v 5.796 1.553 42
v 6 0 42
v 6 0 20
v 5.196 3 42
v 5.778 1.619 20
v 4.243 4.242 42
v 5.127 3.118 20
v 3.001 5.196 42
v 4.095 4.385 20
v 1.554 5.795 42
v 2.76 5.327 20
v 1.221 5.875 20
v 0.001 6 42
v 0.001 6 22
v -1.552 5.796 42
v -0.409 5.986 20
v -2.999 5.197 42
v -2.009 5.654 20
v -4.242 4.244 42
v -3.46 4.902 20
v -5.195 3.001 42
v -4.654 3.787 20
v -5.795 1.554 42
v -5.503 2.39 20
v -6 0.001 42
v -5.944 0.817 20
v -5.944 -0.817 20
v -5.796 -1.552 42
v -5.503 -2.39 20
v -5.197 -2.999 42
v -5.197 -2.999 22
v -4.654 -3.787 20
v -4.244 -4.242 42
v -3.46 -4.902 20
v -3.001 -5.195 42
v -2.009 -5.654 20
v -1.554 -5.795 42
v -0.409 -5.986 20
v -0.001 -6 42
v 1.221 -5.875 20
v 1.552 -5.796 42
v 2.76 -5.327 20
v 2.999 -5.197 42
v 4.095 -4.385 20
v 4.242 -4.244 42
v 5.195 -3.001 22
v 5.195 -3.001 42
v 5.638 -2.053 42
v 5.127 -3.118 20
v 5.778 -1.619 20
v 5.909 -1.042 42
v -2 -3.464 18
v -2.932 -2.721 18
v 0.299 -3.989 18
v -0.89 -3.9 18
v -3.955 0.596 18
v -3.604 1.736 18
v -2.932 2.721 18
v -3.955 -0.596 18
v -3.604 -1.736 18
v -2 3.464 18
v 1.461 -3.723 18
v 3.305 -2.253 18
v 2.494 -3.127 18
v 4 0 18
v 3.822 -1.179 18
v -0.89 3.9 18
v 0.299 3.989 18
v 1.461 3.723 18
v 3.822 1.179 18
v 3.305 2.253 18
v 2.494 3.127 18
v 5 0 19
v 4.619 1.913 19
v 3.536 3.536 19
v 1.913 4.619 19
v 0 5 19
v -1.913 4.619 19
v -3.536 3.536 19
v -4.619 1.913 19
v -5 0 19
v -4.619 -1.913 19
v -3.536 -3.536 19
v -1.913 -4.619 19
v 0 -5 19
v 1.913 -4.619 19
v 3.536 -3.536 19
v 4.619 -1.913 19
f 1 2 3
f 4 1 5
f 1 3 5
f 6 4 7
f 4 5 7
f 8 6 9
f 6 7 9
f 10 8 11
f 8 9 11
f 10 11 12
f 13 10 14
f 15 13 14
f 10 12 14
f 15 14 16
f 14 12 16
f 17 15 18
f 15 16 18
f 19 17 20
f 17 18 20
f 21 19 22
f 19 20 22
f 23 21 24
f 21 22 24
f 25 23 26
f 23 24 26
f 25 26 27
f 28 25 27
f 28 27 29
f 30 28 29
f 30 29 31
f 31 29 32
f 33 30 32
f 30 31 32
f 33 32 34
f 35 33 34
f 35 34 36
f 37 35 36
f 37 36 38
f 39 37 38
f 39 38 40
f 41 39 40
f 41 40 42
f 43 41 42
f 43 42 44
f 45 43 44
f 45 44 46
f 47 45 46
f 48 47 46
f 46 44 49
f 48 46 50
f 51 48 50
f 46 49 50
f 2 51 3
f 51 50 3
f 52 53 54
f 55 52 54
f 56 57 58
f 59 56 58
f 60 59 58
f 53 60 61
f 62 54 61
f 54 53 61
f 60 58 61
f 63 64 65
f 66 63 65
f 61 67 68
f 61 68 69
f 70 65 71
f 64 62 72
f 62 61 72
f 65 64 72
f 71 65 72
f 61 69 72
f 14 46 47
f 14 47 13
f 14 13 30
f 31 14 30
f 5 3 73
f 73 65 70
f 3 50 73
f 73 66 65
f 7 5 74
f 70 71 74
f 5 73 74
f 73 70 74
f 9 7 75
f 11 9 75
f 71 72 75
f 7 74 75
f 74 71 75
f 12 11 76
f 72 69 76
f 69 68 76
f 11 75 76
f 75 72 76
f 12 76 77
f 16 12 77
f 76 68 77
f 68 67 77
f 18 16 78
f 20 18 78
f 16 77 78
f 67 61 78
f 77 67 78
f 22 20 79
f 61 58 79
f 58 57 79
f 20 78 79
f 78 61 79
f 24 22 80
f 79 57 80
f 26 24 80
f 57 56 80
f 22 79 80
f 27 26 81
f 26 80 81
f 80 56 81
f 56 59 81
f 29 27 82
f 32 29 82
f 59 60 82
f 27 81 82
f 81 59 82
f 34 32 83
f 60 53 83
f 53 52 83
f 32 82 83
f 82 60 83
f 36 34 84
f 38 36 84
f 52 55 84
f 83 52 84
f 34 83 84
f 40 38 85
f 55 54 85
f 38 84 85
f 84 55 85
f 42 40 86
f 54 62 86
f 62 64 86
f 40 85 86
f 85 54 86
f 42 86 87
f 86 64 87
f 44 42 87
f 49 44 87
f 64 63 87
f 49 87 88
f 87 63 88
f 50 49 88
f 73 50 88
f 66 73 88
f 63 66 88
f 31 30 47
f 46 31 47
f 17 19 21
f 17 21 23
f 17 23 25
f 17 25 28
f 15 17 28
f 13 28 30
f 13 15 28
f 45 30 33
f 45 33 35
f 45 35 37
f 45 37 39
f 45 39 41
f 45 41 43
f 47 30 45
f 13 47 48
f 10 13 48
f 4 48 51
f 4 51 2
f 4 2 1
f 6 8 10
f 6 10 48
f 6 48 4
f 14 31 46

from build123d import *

# Parameters (mm, degrees)
SKETCH008_R     = 6
PAD002_DEPTH    = 24
POCKET_DEPTH    = 20
CHAMFER001_SIZE = 2


with BuildPart() as part:
    # Sketch008 → Pad002 (new body)
    with BuildSketch(Plane.XY.offset(18)):
        Circle(SKETCH008_R)
    extrude(amount=PAD002_DEPTH)

    # Sketch007 (on Face3 of Pad002) → Pocket (cut)
    with BuildSketch(Plane.XY.offset(42)):
        Polygon((5.195447, -3.001222), (0.001411, 6), (-5.196858, -2.998778), align=None)
    extrude(amount=-POCKET_DEPTH, mode=Mode.SUBTRACT)

    # Chamfer001
    chamfer001_edges = [part.edges().sort_by_distance(p)[0] for p in [
        (-6, 0, 18),
    ]]
    chamfer(chamfer001_edges, length=CHAMFER001_SIZE)


solid = part.part
